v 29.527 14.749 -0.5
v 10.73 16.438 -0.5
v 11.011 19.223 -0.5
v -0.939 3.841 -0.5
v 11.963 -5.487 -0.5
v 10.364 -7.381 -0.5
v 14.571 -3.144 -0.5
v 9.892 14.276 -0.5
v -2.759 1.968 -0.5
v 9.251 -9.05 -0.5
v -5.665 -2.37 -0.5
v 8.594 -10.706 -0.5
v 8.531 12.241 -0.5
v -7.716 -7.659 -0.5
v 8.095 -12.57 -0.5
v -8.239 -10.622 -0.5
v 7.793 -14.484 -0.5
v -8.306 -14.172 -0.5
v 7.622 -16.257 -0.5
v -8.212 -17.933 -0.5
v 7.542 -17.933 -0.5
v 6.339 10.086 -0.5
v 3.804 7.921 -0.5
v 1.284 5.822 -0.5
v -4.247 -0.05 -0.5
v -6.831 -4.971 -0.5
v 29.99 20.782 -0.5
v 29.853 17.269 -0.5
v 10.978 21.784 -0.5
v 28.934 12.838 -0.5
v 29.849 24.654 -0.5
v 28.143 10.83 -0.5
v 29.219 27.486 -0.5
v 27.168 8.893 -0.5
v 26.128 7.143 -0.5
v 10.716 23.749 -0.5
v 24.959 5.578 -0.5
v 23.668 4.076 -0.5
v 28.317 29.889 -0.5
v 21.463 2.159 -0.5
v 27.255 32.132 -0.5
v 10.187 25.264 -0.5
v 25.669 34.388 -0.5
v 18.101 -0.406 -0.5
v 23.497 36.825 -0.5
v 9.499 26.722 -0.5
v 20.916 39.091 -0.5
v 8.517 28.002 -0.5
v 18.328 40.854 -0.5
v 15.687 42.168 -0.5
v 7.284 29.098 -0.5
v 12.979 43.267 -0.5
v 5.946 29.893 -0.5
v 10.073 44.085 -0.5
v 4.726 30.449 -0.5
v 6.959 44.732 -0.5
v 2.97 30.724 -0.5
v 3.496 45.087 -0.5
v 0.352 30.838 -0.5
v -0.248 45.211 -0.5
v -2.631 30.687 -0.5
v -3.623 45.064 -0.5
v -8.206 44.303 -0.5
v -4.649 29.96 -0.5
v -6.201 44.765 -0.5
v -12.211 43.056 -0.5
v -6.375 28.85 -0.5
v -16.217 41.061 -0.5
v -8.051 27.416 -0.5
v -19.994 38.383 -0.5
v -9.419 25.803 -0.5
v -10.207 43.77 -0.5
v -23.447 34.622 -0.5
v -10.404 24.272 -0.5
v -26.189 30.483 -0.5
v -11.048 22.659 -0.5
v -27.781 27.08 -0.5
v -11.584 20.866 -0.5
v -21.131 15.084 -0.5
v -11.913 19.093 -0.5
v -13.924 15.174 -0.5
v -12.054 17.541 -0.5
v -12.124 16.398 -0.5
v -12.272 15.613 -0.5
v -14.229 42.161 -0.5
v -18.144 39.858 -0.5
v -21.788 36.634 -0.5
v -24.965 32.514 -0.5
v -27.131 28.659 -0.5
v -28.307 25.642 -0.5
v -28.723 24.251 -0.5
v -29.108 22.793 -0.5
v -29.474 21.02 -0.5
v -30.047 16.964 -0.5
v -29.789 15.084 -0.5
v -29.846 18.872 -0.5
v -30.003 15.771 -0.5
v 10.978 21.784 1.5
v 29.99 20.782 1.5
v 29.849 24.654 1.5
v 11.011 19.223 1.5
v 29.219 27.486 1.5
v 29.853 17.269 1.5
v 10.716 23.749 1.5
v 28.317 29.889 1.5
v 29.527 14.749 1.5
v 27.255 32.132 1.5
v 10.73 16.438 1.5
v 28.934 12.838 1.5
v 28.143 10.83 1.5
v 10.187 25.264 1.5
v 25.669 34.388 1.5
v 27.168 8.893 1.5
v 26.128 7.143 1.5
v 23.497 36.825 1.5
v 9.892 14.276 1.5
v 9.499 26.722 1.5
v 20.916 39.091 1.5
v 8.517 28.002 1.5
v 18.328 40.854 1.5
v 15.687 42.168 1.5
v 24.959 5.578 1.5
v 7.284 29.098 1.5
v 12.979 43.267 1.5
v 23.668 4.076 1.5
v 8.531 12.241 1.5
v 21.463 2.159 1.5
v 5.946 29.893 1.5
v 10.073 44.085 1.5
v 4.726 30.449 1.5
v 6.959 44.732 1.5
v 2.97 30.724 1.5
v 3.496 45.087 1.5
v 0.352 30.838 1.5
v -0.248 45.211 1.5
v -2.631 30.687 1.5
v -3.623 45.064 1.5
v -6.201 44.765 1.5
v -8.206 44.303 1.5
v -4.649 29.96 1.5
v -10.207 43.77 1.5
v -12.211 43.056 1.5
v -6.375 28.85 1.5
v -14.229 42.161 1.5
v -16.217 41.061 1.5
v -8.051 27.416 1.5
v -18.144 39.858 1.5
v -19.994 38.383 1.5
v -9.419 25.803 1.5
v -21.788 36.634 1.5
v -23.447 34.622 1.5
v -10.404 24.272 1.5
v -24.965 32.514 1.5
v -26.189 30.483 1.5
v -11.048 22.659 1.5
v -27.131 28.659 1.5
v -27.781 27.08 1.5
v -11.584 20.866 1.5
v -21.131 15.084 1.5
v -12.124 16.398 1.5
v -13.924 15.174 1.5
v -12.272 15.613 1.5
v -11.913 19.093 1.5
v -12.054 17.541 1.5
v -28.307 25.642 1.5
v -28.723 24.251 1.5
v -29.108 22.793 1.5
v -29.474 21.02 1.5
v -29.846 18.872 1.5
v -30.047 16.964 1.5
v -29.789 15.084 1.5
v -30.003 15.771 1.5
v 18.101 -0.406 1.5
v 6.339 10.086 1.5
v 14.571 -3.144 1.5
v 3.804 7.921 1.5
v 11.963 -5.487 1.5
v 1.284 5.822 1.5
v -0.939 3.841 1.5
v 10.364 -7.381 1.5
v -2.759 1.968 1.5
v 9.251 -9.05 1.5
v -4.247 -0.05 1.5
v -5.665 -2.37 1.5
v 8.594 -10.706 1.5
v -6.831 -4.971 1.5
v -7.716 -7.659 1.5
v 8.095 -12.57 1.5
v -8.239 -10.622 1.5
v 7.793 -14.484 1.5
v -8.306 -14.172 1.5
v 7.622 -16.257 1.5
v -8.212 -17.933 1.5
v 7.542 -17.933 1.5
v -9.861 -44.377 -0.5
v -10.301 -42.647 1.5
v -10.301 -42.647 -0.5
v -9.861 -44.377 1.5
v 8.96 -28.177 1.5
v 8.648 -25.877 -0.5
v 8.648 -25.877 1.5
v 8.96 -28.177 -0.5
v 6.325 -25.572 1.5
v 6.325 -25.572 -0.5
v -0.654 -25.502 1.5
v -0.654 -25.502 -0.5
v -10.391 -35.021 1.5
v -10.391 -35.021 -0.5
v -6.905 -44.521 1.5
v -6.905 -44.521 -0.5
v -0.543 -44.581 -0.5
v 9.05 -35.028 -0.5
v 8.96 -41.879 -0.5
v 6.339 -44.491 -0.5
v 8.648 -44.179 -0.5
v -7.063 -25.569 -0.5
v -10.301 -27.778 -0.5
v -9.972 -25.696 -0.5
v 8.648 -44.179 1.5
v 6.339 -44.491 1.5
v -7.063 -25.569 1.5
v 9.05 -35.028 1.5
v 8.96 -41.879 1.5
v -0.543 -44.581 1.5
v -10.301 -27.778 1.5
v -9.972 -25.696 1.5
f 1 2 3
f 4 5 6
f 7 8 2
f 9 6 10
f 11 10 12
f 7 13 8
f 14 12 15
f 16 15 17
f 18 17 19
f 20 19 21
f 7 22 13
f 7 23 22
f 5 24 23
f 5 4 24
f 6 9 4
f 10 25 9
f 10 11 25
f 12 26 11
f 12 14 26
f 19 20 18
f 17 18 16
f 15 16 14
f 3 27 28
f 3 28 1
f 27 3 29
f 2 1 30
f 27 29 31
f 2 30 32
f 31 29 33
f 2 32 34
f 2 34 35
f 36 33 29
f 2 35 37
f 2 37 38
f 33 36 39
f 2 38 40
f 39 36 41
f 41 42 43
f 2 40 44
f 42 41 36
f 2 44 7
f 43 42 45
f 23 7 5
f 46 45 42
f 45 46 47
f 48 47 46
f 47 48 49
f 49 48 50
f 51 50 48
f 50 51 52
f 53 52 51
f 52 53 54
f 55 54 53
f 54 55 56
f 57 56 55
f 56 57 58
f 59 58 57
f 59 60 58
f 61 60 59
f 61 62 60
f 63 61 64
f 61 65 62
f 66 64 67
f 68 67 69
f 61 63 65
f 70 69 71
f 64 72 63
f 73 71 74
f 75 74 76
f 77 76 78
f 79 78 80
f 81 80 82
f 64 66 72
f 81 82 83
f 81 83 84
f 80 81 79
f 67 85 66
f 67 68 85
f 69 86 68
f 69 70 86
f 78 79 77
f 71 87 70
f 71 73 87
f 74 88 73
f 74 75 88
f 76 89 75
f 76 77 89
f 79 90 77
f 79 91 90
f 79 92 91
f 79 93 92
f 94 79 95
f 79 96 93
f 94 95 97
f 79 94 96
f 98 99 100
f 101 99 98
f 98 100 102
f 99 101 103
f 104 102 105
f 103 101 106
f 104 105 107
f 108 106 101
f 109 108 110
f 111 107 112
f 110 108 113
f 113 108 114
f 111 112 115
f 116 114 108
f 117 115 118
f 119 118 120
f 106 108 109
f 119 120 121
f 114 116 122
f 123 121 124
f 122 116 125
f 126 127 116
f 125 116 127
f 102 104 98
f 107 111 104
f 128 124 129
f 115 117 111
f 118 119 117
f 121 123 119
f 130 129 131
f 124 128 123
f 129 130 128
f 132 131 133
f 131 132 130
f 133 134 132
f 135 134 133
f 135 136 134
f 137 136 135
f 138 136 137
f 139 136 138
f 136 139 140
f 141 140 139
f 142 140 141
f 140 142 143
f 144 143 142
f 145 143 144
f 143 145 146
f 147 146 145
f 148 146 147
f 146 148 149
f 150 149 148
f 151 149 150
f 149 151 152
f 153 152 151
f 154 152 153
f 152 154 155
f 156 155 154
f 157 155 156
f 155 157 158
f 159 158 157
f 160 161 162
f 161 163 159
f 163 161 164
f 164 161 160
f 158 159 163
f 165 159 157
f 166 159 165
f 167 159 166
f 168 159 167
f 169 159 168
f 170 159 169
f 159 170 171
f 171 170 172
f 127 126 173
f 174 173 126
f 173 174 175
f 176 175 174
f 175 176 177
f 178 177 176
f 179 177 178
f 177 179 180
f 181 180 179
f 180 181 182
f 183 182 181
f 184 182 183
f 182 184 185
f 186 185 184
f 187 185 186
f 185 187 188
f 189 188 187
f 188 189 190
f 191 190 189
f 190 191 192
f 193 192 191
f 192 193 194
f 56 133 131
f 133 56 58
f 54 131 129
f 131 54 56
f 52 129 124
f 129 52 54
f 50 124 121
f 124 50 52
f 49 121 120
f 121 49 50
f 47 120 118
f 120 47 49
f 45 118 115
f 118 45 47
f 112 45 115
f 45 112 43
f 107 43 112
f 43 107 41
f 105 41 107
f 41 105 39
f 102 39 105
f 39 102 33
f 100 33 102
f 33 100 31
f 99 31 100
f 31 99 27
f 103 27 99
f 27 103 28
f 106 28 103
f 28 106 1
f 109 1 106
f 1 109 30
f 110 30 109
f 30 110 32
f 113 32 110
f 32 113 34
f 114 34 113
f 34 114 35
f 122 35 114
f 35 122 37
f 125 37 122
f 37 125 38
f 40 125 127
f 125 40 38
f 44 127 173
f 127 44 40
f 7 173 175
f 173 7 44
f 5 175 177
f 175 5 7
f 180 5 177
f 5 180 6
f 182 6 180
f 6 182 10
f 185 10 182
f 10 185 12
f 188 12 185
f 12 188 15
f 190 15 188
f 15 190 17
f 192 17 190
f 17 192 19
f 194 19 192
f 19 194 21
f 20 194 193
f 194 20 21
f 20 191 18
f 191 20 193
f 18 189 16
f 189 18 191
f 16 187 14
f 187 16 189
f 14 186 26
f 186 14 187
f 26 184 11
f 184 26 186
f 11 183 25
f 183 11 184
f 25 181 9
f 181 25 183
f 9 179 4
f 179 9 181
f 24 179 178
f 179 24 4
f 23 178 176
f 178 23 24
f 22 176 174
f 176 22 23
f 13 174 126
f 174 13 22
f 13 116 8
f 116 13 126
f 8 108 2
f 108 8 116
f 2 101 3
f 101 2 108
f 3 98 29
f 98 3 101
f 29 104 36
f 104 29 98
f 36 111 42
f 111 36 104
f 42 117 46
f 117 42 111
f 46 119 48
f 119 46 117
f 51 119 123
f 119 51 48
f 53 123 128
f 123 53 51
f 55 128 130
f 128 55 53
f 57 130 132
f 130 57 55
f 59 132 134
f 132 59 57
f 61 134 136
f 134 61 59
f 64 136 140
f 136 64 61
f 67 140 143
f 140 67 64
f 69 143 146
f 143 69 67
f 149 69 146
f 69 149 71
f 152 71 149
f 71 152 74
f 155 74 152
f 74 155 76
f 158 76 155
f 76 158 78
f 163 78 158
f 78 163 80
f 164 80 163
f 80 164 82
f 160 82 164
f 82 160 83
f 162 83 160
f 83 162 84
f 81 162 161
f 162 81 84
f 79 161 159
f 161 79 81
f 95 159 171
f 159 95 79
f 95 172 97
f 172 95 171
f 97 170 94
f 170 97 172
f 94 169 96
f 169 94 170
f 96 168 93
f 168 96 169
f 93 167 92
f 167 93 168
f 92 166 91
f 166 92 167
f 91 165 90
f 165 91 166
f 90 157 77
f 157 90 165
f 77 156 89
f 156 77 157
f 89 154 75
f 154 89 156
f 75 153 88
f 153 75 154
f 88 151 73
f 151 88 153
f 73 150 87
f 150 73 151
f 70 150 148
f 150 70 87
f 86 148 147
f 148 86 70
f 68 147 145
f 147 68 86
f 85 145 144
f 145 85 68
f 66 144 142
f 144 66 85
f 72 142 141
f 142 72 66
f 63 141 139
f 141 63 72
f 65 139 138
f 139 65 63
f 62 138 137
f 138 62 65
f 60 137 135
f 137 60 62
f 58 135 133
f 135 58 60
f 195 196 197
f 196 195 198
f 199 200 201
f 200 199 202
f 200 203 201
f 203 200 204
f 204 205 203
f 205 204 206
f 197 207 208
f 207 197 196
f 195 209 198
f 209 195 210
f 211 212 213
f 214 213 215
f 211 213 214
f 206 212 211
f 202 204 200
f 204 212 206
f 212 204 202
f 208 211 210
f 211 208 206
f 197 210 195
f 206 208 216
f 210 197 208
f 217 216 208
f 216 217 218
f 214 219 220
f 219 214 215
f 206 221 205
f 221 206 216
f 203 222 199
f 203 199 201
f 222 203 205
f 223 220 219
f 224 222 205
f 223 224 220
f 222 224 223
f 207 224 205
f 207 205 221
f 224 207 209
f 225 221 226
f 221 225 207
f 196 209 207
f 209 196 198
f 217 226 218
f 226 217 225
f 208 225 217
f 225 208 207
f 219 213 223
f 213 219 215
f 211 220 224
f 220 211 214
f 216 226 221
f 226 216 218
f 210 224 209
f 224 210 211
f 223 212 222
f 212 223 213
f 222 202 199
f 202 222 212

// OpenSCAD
//------------------------------------------------------------
//	Stencil-o-Matic (modified for RossRobotics)
//
//	input comes from:
//	http://chaaawa.com/stencil_factory/
//
//	http://thingiverse.com/Benjamin
//	http://www.thingiverse.com/thing:55821
//------------------------------------------------------------

// preview[view:south, tilt:top]

// paste here after "Convert&Copy"
input = "no_input";

stencil_thickness = 1;
stencil_width = 80;
margin = 10;

// If you don't want to center
offX = 0;
offY = 0;

module void() {}

dispo_width = stencil_width - 2*margin;

points_array = (input=="no_input"? [[179,268],[[199.26,15.12],[189.19,15.56],[181.5,16.45],[175.52,17.83],[169.55,19.42],[163.57,21.55],[157.55,24.22],[151.62,27.5],[145.87,31.09],[140.35,35.49],[135,40.71],[130.05,46.71],[125.52,53],[121.87,59.06],[119.06,64.5],[117.12,69.21],[115.55,73.5],[114.31,77.65],[113.16,82],[112.07,87.29],[110.96,93.7],[110.36,99.39],[110.49,102.95],[111.13,105],[136.96,105],[158.46,104.73],[163.39,103.42],[163.83,101.08],[164.04,97.67],[164.46,93.04],[165.44,87.75],[167.04,82.4],[168.96,77.59],[171.9,73.02],[175.98,68.21],[180.98,63.93],[186.13,60.62],[192.15,58.45],[201.05,58],[208.86,58.34],[214.1,59.16],[217.74,60.82],[221.73,63.19],[225.41,66.46],[228.34,70.28],[230.39,74.63],[231.97,79.15],[232.75,85.01],[232.85,92.65],[232.01,100.96],[229.51,107.41],[225.45,113.48],[218.91,119.91],[211.35,126.37],[203.83,132.63],[197.2,138.54],[191.77,144.13],[187.33,150.15],[183.1,157.07],[179.62,164.83],[176.98,172.85],[175.42,181.69],[175.22,192.28],[175.5,203.5],[199,203.5],[222.5,203.5],[222.74,198.5],[223.25,193.21],[224.15,187.5],[225.64,181.94],[227.6,177],[230.92,172.02],[235.69,166.37],[243.47,159.38],[254,151.21],[264.03,143.56],[270.61,137.84],[274.46,133.36],[277.95,128.69],[281.05,123.47],[283.96,117.69],[286.32,111.7],[288.09,106],[289.06,98.48],[289.47,88],[289.05,76.45],[287.17,68],[284.48,60.83],[281.31,54.14],[276.58,47.41],[270.1,40.14],[262.4,33.38],[254.68,28.12],[246.8,24.2],[238.72,20.92],[230.05,18.48],[220.76,16.55],[210.43,15.49],[199.26,15.12]],[[198.05,226.08],[178.93,226.28],[170.25,226.66],[169.27,232.87],[169,254.48],[169.27,277.23],[170.58,282.39],[179.4,282.82],[198.38,283],[218.91,282.73],[225.8,281.8],[226.73,274.94],[227,254.5],[226.73,234.06],[225.8,227.2],[218.87,226.29],[198.05,226.08]]]: input);

input_width = points_array[0][0];
input_height= points_array[0][1];
sTrace = dispo_width/input_width;
stencil_height = input_height*sTrace + 2*margin;


	translate([offX, offY, -stencil_thickness/2])
	scale([sTrace, -sTrace, 1])
	translate([-200, -150, 0]) {
		union() {
			for (i = [1:len(points_array) -1] ) {
				linear_extrude(height=stencil_thickness*2) {polygon(points_array[i]);}
			}
		}
	}
